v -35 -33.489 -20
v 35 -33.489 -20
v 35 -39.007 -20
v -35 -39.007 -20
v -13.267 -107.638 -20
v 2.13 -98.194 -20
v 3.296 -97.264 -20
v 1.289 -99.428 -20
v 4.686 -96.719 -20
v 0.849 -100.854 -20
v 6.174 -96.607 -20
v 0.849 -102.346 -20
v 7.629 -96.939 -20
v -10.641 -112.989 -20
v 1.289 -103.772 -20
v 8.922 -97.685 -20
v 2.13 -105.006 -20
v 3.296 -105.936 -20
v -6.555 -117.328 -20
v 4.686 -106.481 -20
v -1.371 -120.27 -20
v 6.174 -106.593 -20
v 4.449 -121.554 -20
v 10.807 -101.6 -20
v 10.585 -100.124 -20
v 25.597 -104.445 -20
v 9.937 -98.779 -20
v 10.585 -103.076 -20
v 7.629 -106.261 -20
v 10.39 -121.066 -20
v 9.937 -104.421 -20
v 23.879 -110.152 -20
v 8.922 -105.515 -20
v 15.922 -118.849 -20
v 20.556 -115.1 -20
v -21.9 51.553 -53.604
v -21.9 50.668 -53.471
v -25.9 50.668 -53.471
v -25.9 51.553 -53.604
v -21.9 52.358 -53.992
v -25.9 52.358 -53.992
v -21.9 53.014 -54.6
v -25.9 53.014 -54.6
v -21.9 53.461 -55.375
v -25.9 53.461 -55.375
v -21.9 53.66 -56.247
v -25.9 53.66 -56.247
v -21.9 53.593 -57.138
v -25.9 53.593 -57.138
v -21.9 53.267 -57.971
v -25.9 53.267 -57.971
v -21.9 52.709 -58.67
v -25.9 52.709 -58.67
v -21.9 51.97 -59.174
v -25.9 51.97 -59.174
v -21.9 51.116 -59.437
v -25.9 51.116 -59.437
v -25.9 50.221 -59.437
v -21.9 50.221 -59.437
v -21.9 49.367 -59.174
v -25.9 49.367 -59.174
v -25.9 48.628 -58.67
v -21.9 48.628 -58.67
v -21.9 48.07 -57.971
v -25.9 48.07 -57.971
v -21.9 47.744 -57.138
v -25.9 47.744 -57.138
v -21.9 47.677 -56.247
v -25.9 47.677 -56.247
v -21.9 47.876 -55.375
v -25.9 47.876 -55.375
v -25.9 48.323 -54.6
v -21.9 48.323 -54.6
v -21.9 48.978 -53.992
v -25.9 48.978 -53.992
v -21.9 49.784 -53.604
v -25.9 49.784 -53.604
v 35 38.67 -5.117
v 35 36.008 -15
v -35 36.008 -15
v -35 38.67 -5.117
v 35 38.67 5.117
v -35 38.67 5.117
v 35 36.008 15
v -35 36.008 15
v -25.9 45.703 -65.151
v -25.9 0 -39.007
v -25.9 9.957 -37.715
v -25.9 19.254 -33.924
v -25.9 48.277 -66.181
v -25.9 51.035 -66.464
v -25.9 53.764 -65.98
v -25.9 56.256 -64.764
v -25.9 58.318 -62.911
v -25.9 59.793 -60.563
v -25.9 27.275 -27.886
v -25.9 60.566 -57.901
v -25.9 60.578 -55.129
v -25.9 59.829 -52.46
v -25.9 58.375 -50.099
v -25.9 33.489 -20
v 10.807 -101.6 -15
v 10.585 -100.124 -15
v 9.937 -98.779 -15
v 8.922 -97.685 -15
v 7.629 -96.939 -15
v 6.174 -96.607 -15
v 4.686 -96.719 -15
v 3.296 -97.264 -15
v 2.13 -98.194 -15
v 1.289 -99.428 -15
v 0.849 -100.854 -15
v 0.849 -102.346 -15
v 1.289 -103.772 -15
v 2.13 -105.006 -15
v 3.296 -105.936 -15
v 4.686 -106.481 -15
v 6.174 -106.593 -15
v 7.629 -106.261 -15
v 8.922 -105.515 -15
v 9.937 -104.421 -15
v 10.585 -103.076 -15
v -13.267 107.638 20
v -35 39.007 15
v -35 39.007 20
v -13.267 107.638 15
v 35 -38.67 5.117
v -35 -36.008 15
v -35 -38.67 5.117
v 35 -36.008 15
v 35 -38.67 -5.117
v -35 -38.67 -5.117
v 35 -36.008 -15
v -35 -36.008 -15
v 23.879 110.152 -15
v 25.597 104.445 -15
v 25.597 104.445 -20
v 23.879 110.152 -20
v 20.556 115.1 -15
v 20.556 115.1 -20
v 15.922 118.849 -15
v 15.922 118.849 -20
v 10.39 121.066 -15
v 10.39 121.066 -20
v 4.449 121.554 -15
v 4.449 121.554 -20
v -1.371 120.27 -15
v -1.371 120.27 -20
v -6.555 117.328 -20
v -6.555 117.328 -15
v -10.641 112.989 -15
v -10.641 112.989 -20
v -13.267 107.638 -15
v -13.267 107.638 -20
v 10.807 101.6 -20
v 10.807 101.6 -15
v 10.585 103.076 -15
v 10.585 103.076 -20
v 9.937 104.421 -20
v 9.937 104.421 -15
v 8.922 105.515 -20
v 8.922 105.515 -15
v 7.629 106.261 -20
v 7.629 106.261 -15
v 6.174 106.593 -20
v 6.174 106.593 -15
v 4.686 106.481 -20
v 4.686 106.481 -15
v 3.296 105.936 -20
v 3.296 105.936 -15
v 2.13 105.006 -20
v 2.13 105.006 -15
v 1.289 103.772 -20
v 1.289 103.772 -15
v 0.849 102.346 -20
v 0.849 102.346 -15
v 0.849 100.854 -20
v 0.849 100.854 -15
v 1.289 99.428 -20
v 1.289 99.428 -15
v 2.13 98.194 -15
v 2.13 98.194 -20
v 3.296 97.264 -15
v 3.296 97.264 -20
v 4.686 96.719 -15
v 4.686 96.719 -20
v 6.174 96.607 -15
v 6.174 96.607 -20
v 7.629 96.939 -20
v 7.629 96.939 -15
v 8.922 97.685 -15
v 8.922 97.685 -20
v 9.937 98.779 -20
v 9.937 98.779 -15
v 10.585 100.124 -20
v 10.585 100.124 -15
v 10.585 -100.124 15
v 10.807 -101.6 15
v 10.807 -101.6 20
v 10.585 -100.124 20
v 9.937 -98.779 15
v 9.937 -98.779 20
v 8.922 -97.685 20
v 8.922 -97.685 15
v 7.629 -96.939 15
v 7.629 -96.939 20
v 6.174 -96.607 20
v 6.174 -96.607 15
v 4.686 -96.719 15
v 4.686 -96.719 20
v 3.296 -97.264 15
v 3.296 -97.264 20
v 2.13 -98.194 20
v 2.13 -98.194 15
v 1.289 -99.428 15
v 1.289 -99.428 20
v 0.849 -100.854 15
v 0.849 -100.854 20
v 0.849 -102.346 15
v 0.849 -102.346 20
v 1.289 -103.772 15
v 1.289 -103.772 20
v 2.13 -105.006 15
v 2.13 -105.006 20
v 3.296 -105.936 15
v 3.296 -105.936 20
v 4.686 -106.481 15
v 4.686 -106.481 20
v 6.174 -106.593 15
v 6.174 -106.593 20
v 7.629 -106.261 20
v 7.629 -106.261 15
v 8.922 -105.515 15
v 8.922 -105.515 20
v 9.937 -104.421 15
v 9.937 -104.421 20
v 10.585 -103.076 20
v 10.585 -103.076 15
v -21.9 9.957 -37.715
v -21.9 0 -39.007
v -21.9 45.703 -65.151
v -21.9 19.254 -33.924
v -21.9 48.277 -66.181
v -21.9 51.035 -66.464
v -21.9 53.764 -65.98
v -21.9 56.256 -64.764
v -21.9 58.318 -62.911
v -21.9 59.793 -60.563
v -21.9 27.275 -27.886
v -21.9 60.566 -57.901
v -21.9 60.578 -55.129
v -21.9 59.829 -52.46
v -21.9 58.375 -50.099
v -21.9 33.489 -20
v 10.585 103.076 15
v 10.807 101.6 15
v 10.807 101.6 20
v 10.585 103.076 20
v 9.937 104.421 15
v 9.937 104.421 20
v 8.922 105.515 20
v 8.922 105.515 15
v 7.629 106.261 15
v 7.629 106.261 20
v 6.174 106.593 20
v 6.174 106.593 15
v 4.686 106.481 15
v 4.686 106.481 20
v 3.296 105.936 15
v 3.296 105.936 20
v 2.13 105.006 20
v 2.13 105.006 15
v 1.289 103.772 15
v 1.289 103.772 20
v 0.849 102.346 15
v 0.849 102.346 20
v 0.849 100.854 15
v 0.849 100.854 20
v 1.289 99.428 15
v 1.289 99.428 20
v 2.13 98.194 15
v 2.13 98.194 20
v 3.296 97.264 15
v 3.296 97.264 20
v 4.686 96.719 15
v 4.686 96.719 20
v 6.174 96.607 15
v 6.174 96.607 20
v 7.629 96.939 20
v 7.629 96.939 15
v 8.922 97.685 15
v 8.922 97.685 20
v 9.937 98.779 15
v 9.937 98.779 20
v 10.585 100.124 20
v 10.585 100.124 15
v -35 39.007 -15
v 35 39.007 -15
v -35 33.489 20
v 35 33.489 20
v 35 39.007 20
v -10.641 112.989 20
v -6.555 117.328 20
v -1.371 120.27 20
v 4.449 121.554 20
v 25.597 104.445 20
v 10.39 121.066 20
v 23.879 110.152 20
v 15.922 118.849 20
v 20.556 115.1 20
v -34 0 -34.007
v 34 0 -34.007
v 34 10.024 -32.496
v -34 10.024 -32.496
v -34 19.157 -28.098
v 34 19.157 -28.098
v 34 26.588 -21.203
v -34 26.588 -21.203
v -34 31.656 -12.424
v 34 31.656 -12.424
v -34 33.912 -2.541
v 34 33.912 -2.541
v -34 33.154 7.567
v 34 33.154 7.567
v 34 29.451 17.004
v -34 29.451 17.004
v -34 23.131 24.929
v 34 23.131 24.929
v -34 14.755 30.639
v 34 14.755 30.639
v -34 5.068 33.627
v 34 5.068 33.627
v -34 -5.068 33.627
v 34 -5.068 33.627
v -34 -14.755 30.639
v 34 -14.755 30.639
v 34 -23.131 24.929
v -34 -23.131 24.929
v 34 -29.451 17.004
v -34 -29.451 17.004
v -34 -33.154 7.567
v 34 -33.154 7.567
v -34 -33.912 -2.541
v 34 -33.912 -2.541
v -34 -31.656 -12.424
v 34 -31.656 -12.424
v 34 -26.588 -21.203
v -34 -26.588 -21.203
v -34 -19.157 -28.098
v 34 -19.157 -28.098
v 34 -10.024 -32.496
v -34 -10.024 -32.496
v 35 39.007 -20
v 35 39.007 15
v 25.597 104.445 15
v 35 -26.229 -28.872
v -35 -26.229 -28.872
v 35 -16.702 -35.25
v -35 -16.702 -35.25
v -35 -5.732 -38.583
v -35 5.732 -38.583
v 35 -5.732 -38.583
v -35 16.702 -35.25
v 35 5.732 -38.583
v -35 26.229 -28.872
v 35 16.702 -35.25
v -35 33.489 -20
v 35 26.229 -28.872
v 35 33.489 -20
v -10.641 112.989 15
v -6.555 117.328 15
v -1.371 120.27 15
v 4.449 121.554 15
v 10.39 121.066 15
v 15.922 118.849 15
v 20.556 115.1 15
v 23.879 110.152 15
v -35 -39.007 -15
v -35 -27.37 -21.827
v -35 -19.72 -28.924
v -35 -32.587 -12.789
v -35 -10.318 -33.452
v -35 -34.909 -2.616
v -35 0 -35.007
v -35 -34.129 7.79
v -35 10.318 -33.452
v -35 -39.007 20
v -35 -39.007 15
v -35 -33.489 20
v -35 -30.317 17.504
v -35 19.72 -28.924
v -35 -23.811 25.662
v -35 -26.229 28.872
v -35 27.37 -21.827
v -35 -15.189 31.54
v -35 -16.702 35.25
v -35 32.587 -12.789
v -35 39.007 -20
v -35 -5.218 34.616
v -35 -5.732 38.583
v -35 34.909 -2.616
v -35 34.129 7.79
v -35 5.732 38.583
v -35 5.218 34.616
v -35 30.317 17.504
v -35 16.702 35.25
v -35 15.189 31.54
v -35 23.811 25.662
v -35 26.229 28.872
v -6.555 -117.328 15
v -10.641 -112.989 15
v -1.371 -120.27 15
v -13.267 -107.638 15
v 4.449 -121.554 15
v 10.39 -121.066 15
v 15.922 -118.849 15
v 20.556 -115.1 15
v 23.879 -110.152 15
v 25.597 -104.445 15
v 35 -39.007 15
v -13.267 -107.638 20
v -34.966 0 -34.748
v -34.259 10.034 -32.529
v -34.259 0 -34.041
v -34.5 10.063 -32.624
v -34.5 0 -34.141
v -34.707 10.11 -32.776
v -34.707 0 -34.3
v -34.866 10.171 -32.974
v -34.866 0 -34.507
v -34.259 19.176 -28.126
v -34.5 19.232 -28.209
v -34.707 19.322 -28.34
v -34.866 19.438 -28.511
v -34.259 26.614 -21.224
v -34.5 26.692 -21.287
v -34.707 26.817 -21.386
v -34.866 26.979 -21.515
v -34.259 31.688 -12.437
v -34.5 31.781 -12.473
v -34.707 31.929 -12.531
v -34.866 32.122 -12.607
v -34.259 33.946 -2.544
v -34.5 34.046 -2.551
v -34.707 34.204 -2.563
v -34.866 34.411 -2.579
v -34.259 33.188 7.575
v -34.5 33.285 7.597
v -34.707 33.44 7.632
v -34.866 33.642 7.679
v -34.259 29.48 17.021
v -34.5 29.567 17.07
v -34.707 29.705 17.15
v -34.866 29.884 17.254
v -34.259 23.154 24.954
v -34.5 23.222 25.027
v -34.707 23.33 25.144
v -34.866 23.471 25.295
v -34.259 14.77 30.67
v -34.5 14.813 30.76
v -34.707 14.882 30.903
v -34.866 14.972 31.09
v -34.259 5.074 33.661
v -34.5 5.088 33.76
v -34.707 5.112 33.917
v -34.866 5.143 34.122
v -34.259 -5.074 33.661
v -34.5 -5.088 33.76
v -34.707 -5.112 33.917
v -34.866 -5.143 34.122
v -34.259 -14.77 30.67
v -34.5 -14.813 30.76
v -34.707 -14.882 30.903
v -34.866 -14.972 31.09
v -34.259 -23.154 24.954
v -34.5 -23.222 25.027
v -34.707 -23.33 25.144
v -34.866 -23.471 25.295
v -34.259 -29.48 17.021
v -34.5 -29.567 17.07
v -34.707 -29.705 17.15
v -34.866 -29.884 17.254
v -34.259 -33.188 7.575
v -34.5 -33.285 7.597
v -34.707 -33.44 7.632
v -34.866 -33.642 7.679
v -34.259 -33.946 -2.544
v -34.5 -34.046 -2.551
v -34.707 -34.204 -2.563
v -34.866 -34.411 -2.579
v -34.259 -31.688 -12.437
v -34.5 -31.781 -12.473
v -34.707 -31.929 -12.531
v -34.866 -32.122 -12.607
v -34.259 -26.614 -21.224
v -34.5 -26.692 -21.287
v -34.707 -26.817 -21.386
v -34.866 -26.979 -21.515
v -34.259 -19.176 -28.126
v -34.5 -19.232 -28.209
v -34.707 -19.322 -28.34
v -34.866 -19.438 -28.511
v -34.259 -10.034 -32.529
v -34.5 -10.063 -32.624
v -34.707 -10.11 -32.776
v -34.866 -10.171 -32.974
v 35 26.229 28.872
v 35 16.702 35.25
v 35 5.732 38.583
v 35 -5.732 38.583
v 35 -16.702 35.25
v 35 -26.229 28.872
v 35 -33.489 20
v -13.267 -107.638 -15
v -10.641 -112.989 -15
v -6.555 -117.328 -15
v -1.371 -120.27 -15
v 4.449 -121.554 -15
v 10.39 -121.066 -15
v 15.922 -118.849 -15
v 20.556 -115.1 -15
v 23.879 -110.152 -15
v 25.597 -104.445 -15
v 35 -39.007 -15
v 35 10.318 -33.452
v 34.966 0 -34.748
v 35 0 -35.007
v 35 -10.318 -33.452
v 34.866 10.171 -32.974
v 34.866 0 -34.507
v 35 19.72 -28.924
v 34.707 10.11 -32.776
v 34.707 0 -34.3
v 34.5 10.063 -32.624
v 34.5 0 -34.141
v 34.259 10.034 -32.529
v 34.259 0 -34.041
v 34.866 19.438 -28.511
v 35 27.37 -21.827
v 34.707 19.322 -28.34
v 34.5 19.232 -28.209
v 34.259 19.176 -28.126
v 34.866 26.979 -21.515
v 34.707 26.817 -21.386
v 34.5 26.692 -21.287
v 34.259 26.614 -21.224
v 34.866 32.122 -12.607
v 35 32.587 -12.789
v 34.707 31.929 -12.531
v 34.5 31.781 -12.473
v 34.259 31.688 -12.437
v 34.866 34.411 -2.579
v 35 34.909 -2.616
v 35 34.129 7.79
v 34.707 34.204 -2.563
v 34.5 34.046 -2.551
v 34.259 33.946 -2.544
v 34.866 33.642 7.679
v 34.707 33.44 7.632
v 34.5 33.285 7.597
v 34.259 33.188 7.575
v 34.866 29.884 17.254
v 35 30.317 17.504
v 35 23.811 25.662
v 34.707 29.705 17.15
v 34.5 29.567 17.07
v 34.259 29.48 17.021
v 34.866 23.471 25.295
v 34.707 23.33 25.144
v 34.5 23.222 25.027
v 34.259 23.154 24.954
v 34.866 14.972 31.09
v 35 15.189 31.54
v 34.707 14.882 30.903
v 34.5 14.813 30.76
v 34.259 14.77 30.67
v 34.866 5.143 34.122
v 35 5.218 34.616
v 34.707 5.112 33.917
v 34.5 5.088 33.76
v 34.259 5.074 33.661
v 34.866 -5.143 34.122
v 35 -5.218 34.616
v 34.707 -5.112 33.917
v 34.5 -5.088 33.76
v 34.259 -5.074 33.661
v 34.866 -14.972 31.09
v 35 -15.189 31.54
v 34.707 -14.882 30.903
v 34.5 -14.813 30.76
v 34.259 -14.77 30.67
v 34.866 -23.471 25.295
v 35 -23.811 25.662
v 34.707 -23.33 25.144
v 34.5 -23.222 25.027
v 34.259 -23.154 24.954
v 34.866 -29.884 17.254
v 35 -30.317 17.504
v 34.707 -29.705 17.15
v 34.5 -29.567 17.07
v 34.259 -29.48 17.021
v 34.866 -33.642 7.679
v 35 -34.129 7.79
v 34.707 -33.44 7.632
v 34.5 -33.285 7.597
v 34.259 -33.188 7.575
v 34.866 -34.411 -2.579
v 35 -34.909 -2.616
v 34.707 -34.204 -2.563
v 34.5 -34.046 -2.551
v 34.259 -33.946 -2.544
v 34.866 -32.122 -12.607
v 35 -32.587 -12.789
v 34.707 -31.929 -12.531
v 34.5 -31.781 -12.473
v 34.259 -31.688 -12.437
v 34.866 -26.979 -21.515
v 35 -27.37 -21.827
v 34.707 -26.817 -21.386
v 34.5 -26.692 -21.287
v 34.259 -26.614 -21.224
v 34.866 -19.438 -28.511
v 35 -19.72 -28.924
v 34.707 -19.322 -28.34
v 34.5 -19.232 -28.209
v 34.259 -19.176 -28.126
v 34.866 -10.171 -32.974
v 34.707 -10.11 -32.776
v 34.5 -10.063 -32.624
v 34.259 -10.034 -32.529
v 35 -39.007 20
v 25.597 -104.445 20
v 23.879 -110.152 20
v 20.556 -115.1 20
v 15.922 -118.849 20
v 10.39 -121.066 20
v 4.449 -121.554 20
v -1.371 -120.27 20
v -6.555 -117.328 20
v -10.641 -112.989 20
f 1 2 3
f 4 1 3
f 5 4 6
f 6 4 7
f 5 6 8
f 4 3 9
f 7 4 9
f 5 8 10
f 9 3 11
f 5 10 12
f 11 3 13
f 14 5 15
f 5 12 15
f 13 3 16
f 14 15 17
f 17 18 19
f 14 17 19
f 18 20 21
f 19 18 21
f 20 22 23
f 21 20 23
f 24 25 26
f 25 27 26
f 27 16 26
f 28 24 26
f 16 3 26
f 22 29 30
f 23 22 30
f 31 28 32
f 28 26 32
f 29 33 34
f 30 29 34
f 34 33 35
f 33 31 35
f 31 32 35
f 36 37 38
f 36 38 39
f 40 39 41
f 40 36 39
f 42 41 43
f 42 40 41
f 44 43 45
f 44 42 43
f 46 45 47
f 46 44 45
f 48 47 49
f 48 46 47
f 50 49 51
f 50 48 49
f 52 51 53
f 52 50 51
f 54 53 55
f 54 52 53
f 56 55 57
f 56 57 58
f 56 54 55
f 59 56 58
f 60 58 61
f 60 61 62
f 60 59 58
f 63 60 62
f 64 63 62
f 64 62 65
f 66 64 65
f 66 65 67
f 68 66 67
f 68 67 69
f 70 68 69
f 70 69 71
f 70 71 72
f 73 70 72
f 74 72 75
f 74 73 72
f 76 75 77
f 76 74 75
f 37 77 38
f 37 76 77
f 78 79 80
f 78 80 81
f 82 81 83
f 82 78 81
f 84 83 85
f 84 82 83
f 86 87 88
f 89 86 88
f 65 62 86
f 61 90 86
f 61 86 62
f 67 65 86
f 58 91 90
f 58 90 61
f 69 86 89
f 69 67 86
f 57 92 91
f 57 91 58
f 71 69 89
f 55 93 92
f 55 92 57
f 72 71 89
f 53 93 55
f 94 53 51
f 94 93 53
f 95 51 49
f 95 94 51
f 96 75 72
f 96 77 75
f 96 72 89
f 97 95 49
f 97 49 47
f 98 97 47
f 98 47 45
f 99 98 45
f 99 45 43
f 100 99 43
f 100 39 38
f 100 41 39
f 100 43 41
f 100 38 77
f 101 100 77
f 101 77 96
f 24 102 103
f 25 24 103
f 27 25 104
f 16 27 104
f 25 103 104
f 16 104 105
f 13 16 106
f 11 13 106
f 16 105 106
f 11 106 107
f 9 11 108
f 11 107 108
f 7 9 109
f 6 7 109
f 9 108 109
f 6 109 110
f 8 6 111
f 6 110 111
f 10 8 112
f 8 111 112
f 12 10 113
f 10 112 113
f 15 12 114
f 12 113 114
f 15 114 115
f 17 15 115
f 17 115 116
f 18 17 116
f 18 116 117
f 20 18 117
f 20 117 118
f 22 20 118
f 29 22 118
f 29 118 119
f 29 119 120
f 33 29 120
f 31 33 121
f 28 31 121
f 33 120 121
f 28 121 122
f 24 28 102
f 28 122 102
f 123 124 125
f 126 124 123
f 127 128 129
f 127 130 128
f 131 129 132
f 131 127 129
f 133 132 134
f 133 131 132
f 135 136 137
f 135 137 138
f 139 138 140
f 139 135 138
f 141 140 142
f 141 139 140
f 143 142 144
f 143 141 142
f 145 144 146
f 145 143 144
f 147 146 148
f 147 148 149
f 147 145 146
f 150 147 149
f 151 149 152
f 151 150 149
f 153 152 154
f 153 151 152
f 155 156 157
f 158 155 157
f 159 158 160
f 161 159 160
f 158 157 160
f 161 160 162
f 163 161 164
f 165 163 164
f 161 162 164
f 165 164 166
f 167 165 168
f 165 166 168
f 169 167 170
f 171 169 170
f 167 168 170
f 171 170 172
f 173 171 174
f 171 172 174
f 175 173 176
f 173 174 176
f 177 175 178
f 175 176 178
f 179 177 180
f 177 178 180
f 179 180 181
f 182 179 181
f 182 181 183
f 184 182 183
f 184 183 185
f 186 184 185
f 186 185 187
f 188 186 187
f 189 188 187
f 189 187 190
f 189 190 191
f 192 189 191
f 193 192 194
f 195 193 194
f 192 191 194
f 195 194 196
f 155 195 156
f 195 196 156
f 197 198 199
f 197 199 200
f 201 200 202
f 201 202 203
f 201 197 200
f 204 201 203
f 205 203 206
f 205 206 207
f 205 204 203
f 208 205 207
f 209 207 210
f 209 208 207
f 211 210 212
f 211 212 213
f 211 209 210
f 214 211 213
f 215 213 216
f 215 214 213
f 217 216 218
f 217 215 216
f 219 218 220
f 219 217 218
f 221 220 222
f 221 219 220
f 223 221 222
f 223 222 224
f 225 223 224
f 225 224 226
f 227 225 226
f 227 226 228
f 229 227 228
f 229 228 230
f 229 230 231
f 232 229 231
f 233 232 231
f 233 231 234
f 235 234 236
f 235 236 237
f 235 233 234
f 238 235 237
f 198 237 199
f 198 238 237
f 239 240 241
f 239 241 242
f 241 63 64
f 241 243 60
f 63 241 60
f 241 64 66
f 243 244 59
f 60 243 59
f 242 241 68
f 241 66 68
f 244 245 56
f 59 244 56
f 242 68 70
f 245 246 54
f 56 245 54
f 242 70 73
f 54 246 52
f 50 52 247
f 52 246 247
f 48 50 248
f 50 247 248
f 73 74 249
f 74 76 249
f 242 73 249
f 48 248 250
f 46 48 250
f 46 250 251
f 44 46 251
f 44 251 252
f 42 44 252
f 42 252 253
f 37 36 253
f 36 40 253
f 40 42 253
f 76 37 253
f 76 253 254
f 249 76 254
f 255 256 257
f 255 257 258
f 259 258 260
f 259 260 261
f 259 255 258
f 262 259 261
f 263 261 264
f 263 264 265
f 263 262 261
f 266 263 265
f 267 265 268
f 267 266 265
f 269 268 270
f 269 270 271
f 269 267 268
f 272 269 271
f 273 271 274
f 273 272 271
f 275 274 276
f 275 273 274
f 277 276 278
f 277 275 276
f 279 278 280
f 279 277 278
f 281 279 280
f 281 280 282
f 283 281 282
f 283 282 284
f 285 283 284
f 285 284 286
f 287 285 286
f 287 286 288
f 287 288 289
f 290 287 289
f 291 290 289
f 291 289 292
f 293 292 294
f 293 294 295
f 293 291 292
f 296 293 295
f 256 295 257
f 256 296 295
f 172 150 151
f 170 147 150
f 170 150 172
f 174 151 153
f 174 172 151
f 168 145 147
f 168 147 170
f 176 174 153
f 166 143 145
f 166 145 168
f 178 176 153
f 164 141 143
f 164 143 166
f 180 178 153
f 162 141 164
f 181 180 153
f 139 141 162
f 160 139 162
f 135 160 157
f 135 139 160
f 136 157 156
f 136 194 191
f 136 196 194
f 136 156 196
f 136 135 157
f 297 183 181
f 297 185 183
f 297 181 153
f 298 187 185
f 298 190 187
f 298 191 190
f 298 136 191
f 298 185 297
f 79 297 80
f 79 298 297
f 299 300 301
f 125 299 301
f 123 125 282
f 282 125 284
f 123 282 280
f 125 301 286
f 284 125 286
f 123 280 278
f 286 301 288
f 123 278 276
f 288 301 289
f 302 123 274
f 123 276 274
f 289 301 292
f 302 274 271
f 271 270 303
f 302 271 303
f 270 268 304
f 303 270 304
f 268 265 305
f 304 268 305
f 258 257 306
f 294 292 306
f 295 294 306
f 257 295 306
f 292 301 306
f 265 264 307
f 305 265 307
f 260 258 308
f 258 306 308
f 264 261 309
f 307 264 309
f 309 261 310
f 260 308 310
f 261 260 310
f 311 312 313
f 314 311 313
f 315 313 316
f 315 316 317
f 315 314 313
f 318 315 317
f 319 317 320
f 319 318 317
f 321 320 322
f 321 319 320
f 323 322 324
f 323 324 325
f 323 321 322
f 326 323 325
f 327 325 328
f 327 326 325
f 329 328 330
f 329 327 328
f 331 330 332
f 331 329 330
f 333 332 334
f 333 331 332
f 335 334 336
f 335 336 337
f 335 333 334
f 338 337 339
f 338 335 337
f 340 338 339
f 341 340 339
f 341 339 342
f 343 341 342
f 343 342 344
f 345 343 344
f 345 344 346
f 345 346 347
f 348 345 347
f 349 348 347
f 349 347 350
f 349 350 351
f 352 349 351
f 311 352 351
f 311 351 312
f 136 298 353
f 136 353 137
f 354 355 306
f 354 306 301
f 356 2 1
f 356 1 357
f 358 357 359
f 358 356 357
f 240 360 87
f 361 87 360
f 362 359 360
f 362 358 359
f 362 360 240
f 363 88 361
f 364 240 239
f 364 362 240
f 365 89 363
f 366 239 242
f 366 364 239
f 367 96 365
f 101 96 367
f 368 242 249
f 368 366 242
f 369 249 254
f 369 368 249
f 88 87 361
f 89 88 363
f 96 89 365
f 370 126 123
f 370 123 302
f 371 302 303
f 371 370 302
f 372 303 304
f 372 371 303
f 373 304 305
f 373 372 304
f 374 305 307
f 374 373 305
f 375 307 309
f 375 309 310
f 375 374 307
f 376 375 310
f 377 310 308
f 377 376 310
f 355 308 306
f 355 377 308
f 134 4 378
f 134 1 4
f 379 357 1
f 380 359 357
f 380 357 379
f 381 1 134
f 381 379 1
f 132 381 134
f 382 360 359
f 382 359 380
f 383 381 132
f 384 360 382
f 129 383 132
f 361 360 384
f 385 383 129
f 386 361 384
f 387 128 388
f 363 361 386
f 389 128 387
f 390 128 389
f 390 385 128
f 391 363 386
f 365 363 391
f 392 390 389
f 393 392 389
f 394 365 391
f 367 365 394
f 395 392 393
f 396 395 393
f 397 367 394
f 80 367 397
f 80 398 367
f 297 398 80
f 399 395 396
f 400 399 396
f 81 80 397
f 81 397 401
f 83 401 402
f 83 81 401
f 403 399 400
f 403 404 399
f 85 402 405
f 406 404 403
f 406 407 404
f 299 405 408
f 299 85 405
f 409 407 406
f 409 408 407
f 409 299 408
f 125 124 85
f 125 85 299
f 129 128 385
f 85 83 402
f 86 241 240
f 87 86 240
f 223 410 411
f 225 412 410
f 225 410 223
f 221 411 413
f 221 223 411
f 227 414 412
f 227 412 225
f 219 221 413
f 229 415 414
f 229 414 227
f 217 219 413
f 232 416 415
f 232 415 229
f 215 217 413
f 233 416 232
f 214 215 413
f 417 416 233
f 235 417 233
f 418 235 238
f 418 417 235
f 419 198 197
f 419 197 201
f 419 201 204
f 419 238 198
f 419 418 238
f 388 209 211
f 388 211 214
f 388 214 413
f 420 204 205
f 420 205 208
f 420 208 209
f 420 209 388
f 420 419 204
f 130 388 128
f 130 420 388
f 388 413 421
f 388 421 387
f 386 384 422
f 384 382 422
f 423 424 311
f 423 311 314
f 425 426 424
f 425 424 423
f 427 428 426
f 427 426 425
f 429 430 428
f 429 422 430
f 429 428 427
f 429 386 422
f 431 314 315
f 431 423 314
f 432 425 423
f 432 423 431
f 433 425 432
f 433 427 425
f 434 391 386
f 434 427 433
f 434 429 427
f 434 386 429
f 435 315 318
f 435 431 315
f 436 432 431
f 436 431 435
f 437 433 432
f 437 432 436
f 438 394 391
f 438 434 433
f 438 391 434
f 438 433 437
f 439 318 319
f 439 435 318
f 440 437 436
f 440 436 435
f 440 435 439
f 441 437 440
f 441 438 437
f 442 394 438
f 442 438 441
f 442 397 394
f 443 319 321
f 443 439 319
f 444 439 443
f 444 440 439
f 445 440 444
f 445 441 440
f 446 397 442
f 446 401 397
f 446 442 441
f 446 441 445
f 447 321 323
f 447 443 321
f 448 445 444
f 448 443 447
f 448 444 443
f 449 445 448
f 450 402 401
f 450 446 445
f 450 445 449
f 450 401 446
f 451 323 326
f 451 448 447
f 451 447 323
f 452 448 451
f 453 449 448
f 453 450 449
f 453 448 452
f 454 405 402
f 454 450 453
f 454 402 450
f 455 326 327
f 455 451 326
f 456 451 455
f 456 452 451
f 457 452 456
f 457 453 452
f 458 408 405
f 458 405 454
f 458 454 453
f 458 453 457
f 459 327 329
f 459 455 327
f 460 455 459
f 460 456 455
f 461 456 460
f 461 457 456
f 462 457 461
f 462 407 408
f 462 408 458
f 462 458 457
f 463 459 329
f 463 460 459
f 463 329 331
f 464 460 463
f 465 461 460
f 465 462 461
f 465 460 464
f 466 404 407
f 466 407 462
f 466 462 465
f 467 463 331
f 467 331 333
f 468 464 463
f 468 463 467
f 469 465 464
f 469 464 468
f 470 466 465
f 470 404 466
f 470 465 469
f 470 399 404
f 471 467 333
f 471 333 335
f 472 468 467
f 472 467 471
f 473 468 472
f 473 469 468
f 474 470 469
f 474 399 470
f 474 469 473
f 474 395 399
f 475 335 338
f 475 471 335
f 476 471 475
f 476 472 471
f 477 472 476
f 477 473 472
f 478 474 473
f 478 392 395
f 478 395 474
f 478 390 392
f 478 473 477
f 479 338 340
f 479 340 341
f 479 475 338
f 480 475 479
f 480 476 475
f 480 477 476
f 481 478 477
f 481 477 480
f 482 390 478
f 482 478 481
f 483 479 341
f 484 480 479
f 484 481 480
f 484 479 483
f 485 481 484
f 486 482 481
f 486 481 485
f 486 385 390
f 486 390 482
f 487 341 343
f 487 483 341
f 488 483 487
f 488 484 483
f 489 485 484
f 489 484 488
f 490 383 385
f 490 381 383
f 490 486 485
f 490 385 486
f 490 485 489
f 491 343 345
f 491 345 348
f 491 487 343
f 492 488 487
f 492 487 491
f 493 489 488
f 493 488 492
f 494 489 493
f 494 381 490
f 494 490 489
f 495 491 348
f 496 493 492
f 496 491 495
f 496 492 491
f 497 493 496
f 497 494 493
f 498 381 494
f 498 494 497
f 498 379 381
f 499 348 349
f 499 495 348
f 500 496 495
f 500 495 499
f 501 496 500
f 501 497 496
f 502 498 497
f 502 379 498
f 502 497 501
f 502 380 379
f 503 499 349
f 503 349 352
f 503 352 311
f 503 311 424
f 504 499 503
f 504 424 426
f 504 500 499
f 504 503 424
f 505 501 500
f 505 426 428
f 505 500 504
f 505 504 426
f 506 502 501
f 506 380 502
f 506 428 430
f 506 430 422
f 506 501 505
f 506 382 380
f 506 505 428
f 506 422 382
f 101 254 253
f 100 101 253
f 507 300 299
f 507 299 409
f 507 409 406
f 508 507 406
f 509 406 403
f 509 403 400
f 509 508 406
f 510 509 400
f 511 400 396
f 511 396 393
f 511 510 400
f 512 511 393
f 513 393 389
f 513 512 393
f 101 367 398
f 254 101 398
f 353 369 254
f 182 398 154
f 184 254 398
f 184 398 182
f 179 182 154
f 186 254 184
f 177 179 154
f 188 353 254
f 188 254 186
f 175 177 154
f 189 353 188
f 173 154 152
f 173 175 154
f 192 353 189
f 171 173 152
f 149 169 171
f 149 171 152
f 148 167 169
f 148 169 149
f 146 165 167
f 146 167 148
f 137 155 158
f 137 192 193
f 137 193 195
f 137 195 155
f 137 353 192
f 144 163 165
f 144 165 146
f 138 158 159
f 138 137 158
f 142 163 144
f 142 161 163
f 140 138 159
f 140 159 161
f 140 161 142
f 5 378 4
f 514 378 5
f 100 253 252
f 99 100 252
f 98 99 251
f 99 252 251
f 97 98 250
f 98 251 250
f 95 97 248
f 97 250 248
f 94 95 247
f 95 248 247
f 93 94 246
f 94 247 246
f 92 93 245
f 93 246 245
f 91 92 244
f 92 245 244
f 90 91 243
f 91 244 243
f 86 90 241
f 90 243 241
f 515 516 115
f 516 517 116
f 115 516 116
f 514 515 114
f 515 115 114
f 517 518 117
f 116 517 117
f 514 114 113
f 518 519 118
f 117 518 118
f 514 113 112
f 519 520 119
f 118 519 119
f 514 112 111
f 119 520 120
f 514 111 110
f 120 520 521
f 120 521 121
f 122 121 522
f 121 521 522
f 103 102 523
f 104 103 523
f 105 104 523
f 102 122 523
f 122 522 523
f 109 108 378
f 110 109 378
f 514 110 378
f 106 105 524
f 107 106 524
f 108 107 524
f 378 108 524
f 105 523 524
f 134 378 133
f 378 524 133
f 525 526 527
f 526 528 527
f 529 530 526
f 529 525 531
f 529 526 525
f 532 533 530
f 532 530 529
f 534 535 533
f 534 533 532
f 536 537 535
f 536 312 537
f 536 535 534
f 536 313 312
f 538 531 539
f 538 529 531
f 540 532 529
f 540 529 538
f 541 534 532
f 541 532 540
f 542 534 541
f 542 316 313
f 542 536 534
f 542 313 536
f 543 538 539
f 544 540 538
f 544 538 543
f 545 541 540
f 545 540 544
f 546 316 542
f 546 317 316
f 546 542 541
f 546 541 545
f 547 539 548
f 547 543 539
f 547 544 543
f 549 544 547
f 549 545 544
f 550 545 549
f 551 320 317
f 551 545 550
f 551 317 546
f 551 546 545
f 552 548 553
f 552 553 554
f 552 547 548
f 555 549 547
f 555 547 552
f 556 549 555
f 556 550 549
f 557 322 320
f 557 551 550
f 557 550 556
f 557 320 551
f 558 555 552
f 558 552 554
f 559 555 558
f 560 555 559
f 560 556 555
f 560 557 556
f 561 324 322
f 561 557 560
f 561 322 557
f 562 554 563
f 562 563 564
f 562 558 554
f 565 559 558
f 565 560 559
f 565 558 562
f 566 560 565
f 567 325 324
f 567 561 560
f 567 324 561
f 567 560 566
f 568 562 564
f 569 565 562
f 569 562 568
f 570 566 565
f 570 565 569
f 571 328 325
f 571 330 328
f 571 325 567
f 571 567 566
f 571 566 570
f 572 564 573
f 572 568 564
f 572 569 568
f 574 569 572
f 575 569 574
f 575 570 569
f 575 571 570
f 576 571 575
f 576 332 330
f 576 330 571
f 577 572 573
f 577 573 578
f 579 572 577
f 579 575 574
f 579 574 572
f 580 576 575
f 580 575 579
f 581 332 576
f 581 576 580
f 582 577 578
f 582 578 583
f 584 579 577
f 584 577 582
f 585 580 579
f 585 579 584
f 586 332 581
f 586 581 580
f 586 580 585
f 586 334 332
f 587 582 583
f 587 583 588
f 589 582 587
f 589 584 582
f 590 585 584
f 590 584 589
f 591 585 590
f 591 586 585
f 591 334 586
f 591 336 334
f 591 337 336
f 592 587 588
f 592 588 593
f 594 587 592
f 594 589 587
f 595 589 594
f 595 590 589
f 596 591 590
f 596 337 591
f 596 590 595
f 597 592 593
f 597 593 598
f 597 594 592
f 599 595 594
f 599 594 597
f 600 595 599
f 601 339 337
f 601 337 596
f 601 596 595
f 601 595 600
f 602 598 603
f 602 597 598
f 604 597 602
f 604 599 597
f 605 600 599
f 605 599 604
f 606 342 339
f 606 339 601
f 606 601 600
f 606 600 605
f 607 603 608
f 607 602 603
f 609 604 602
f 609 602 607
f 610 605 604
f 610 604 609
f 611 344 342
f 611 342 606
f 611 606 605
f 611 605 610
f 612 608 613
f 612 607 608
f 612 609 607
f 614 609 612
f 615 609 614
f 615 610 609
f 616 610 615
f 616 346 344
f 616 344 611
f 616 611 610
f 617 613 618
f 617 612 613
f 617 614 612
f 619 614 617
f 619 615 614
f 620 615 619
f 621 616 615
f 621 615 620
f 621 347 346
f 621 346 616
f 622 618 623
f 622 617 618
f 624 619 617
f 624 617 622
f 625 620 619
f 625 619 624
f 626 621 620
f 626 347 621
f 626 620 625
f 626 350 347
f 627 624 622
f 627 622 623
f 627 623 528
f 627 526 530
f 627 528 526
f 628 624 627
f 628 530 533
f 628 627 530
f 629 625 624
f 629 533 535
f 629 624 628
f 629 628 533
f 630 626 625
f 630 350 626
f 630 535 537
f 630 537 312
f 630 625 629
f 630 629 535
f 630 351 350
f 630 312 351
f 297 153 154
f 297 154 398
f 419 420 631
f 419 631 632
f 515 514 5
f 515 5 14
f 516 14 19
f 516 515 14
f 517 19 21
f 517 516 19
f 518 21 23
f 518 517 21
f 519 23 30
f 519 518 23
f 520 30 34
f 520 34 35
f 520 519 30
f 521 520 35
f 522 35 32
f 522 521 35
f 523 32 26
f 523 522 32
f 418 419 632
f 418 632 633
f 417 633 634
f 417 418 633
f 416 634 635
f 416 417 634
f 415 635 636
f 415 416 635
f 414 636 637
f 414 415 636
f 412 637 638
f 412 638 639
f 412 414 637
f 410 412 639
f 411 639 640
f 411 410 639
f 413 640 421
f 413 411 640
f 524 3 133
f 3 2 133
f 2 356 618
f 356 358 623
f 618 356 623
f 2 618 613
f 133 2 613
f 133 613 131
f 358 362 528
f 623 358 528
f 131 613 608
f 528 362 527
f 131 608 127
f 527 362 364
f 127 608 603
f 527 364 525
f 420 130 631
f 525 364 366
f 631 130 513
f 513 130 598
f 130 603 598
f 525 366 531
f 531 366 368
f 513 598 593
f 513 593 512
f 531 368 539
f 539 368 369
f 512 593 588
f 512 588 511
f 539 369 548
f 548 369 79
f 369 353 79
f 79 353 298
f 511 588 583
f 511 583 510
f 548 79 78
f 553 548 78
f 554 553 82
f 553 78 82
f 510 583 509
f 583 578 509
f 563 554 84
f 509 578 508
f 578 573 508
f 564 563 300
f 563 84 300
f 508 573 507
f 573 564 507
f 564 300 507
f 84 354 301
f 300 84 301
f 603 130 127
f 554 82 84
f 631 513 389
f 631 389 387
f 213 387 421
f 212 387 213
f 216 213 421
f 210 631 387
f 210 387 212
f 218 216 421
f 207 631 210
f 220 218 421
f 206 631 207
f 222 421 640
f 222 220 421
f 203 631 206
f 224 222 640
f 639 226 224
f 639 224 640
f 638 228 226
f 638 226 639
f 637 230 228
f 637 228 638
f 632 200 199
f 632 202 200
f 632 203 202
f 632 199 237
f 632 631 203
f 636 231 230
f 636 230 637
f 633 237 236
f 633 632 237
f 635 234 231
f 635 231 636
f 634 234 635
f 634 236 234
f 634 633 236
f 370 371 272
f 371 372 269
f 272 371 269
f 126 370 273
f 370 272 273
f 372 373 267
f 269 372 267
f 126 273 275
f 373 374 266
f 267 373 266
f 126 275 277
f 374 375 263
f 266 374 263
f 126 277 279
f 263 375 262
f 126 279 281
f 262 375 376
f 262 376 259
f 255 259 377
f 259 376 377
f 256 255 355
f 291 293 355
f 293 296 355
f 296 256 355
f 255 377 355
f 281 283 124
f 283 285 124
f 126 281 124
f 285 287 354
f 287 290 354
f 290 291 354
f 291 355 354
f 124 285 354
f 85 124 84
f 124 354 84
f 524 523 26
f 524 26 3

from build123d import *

# Parameters (mm, degrees)
SKETCH1_R             = 39.007
SKETCH1_R_2           = 34.007
BOSS_EXTRUDE1_DEPTH   = 35
BOSS_EXTRUDE2_START   = 15
SKETCH2_R             = 5.007
BOSS_EXTRUDE2_DEPTH   = 5
BOSS_EXTRUDE2_2_DEPTH = 5
BOSS_EXTRUDE3_START   = -15
SKETCH3_R             = 5.007
BOSS_EXTRUDE3_DEPTH   = 5
BOSS_EXTRUDE3_2_DEPTH = 5
BOSS_EXTRUDE4_DEPTH   = 70
BOSS_EXTRUDE6_START   = -4
SKETCH6_R             = 3
BOSS_EXTRUDE6_DEPTH   = 4
FILLET1_R             = 1
FILLET2_R             = 1


with BuildPart() as part:
    # Sketch1 → Boss-Extrude1 (new, symmetric)
    with BuildSketch(Plane(origin=(0, 0, 0), x_dir=(0, 0, -1), z_dir=(1, 0, 0))):
        Circle(SKETCH1_R)
        Circle(SKETCH1_R_2, mode=Mode.SUBTRACT)
    extrude(amount=BOSS_EXTRUDE1_DEPTH, both=True)



with BuildPart() as body_2:
    # Sketch2 → Boss-Extrude2 (new body)
    with BuildSketch(Plane.XY.offset(BOSS_EXTRUDE2_START)):
        with BuildLine():
            Line((-35, -39.007), (35, -39.007))
            Line((35, -39.007), (25.596649495, -104.444761639))
            ThreePointArc((25.596649495, -104.444761639), (7.437713907, -121.532834549), (-13.266839867, -107.637848746))
            Line((-13.266839867, -107.637848746), (-35, -39.007))
        make_face()
        with Locations((5.8, -101.6)):
            Circle(SKETCH2_R, mode=Mode.SUBTRACT)
    extrude(amount=BOSS_EXTRUDE2_DEPTH)


with BuildPart() as body_3:
    # Sketch2 → Boss-Extrude2 2 (new body)
    with BuildSketch(Plane.XY.offset(BOSS_EXTRUDE2_START)):
        with BuildLine():
            Line((35, 39.007), (-35, 39.007))
            Line((-35, 39.007), (-13.266839867, 107.637848746))
            ThreePointArc((-13.266839867, 107.637848746), (7.437713907, 121.532834549), (25.596649495, 104.444761639))
            Line((25.596649495, 104.444761639), (35, 39.007))
        make_face()
        with Locations((5.8, 101.6)):
            Circle(SKETCH2_R, mode=Mode.SUBTRACT)
    extrude(amount=BOSS_EXTRUDE2_2_DEPTH)


with BuildPart() as body_4:
    # Sketch3 → Boss-Extrude3 (new body)
    with BuildSketch(Plane.XY.offset(BOSS_EXTRUDE3_START)):
        with BuildLine():
            Line((-35, -39.007), (-13.266839867, -107.637848746))
            ThreePointArc((-13.266839867, -107.637848746), (7.437713907, -121.532834549), (25.596649495, -104.444761639))
            Line((25.596649495, -104.444761639), (35, -39.007))
            Line((35, -39.007), (-35, -39.007))
        make_face()
        with Locations((5.8, -101.6)):
            Circle(SKETCH3_R, mode=Mode.SUBTRACT)
    extrude(amount=-BOSS_EXTRUDE3_DEPTH)


with BuildPart() as body_5:
    # Sketch3 → Boss-Extrude3 2 (new body)
    with BuildSketch(Plane.XY.offset(BOSS_EXTRUDE3_START)):
        with BuildLine():
            Line((-35, 39.007), (35, 39.007))
            Line((35, 39.007), (25.596649495, 104.444761639))
            ThreePointArc((25.596649495, 104.444761639), (7.437713907, 121.532834549), (-13.266839867, 107.637848746))
            Line((-13.266839867, 107.637848746), (-35, 39.007))
        make_face()
        with Locations((5.8, 101.6)):
            Circle(SKETCH3_R, mode=Mode.SUBTRACT)
    extrude(amount=-BOSS_EXTRUDE3_2_DEPTH)


with BuildPart() as part_1:
    add(part.part)

    add(body_2.part)  # Boss-Extrude4 merges body 2

    add(body_3.part)  # Boss-Extrude4 merges body 3

    add(body_4.part)  # Boss-Extrude4 merges body 4

    add(body_5.part)  # Boss-Extrude4 merges body 5
    # Sketch4 → Boss-Extrude4 (add)
    with BuildSketch(Plane(origin=(35, 0, 0), x_dir=(0, 0, -1), z_dir=(1, 0, 0))):
        with BuildLine():
            Line((20, -39.007), (15, -39.007))
            Line((15, -39.007), (15, -36.007583215))
            ThreePointArc((15, -36.007583215), (17.545232866, -34.838353186), (20, -33.489491621))
            Line((20, -33.489491621), (20, -39.007))
        make_face()
        with BuildLine():
            Line((-20, -39.007), (-15, -39.007))
            Line((-15, -39.007), (-15, -36.007583215))
            ThreePointArc((-15, -36.007583215), (-17.545232866, -34.838353186), (-20, -33.489491621))
            Line((-20, -33.489491621), (-20, -39.007))
        make_face()
        with BuildLine():
            Line((-20, 39.007), (-15, 39.007))
            Line((-15, 39.007), (-15, 36.007583215))
            ThreePointArc((-15, 36.007583215), (-17.545232866, 34.838353186), (-20, 33.489491621))
            Line((-20, 33.489491621), (-20, 39.007))
        make_face()
        with BuildLine():
            Line((20, 39.007), (15, 39.007))
            Line((15, 39.007), (15, 36.007583215))
            ThreePointArc((15, 36.007583215), (17.545232866, 34.838353186), (20, 33.489491621))
            Line((20, 33.489491621), (20, 39.007))
        make_face()
    extrude(amount=-BOSS_EXTRUDE4_DEPTH)

    # Sketch6 → Boss-Extrude6 (add)
    with BuildSketch(Plane.ZY.offset(25.9).offset(BOSS_EXTRUDE6_START)):
        with BuildLine():
            Line((-20, 33.489491621), (-50.098811723, 58.375353815))
            ThreePointArc((-50.098811723, 58.375353815), (-62.911300808, 58.318387785), (-65.151054806, 45.703054903))
            Line((-65.151054806, 45.703054903), (-39.007, 0))
            ThreePointArc((-39.007, 0), (-33.924077357, 19.253649641), (-20, 33.489491621))
        make_face()
        with Locations((-56.470917013, 50.668455984)):
            Circle(SKETCH6_R, mode=Mode.SUBTRACT)
    extrude(amount=BOSS_EXTRUDE6_DEPTH)

    # Fillet1
    fillet1_edges = [part_1.edges().sort_by_distance(p)[0] for p in [
        (35, 0, 34.007),
    ]]
    fillet(fillet1_edges, radius=FILLET1_R)

    # Fillet2
    fillet2_edges = [part_1.edges().sort_by_distance(p)[0] for p in [
        (-35, 0, 34.007),
    ]]
    fillet(fillet2_edges, radius=FILLET2_R)


solid = part_1.part
